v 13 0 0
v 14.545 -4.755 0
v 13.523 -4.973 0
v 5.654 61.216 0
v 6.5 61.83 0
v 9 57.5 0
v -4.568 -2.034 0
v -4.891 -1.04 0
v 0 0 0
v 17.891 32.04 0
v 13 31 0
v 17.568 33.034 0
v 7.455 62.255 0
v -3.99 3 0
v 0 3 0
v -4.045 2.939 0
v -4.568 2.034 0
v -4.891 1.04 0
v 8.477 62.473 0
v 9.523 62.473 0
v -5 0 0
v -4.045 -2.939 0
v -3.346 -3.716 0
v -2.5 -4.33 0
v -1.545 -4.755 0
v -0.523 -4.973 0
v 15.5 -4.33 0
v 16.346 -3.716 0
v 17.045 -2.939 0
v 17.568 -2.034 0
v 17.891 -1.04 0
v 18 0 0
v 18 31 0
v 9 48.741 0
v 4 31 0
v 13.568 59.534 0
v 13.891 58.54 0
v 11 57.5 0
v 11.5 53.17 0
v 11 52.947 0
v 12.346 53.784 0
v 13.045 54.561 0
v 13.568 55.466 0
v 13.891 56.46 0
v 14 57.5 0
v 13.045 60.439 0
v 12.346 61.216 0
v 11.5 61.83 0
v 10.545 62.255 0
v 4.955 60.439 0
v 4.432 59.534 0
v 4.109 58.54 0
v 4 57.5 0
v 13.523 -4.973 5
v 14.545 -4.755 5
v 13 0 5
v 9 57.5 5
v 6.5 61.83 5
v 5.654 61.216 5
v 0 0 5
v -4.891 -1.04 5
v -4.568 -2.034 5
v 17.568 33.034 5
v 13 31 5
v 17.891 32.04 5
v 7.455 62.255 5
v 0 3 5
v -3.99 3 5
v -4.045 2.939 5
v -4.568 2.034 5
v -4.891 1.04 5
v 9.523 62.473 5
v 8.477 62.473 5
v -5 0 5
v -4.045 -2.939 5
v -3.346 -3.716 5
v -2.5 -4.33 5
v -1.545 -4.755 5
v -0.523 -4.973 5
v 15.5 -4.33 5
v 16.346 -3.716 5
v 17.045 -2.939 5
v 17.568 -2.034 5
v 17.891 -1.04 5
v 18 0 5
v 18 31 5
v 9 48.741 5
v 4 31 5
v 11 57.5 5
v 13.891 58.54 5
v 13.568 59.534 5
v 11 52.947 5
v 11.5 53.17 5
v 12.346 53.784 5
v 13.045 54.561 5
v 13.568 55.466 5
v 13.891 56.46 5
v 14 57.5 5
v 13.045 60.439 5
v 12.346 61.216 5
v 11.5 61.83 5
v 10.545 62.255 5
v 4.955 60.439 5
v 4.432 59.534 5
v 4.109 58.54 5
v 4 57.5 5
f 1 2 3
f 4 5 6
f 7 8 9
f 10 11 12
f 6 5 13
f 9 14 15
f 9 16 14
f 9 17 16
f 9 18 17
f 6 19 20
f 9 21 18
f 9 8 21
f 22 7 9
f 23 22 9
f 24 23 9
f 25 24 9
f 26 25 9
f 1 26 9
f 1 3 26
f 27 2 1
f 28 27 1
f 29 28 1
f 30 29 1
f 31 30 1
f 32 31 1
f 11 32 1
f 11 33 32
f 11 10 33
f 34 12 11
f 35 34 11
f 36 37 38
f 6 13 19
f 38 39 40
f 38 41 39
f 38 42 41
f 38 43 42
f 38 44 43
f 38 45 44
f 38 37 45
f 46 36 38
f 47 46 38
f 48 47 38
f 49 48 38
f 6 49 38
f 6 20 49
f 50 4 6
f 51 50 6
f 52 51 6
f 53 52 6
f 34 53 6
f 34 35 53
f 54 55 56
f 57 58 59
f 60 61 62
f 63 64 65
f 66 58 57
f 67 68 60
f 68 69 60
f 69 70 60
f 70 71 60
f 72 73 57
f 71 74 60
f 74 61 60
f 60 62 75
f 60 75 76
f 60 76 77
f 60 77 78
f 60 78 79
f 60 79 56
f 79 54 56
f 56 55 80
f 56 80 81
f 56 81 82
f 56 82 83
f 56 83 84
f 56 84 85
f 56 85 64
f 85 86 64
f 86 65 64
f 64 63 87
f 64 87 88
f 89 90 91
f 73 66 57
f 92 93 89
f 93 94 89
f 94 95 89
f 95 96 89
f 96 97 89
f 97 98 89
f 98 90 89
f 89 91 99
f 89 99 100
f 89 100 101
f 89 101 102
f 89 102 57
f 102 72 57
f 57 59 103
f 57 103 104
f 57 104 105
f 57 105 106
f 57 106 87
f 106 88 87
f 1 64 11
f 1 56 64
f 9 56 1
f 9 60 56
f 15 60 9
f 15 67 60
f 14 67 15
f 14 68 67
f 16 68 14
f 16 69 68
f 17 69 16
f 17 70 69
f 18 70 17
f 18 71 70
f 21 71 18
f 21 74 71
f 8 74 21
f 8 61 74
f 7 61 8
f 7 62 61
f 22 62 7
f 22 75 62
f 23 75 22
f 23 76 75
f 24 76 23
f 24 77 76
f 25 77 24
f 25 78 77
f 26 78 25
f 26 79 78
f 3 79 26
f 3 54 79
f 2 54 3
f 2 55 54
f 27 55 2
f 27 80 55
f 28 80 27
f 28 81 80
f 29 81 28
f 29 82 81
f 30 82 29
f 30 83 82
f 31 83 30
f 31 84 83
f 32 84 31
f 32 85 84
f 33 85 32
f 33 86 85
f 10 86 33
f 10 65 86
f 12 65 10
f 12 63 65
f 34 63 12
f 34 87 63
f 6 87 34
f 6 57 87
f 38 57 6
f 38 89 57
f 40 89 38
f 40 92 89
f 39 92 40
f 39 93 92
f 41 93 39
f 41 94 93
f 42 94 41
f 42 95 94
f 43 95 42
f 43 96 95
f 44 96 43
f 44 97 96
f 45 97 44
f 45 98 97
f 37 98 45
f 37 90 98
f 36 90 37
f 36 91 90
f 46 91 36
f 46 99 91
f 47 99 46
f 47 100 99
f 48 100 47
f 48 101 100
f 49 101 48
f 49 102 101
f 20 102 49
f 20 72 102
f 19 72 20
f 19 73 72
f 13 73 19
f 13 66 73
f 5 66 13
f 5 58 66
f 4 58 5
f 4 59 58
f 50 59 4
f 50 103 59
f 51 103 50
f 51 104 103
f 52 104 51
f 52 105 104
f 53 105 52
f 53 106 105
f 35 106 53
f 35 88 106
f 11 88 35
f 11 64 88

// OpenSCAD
$fs=.2;
linear_extrude(5){
difference(){
union(){
hull(){
circle(5);
	translate([13,0])circle(5);
}
hull(){
	translate([13,0])circle(5);
		translate([13,31])circle(5);
	translate([4,47.5])circle(5);

	}
}
square([13,31]);
translate([-6,3])square([10,300]);
}
intersection(){
	union(){
translate([4,47.5])square([5,15]);
translate([9,57.5])square([2,5]);
translate([11,52.5])square([3,10]);
		}
		union(){
			translate([4,47.5])square([5,10]);

		translate([9,57.5])circle(5);
		}

	}
}
